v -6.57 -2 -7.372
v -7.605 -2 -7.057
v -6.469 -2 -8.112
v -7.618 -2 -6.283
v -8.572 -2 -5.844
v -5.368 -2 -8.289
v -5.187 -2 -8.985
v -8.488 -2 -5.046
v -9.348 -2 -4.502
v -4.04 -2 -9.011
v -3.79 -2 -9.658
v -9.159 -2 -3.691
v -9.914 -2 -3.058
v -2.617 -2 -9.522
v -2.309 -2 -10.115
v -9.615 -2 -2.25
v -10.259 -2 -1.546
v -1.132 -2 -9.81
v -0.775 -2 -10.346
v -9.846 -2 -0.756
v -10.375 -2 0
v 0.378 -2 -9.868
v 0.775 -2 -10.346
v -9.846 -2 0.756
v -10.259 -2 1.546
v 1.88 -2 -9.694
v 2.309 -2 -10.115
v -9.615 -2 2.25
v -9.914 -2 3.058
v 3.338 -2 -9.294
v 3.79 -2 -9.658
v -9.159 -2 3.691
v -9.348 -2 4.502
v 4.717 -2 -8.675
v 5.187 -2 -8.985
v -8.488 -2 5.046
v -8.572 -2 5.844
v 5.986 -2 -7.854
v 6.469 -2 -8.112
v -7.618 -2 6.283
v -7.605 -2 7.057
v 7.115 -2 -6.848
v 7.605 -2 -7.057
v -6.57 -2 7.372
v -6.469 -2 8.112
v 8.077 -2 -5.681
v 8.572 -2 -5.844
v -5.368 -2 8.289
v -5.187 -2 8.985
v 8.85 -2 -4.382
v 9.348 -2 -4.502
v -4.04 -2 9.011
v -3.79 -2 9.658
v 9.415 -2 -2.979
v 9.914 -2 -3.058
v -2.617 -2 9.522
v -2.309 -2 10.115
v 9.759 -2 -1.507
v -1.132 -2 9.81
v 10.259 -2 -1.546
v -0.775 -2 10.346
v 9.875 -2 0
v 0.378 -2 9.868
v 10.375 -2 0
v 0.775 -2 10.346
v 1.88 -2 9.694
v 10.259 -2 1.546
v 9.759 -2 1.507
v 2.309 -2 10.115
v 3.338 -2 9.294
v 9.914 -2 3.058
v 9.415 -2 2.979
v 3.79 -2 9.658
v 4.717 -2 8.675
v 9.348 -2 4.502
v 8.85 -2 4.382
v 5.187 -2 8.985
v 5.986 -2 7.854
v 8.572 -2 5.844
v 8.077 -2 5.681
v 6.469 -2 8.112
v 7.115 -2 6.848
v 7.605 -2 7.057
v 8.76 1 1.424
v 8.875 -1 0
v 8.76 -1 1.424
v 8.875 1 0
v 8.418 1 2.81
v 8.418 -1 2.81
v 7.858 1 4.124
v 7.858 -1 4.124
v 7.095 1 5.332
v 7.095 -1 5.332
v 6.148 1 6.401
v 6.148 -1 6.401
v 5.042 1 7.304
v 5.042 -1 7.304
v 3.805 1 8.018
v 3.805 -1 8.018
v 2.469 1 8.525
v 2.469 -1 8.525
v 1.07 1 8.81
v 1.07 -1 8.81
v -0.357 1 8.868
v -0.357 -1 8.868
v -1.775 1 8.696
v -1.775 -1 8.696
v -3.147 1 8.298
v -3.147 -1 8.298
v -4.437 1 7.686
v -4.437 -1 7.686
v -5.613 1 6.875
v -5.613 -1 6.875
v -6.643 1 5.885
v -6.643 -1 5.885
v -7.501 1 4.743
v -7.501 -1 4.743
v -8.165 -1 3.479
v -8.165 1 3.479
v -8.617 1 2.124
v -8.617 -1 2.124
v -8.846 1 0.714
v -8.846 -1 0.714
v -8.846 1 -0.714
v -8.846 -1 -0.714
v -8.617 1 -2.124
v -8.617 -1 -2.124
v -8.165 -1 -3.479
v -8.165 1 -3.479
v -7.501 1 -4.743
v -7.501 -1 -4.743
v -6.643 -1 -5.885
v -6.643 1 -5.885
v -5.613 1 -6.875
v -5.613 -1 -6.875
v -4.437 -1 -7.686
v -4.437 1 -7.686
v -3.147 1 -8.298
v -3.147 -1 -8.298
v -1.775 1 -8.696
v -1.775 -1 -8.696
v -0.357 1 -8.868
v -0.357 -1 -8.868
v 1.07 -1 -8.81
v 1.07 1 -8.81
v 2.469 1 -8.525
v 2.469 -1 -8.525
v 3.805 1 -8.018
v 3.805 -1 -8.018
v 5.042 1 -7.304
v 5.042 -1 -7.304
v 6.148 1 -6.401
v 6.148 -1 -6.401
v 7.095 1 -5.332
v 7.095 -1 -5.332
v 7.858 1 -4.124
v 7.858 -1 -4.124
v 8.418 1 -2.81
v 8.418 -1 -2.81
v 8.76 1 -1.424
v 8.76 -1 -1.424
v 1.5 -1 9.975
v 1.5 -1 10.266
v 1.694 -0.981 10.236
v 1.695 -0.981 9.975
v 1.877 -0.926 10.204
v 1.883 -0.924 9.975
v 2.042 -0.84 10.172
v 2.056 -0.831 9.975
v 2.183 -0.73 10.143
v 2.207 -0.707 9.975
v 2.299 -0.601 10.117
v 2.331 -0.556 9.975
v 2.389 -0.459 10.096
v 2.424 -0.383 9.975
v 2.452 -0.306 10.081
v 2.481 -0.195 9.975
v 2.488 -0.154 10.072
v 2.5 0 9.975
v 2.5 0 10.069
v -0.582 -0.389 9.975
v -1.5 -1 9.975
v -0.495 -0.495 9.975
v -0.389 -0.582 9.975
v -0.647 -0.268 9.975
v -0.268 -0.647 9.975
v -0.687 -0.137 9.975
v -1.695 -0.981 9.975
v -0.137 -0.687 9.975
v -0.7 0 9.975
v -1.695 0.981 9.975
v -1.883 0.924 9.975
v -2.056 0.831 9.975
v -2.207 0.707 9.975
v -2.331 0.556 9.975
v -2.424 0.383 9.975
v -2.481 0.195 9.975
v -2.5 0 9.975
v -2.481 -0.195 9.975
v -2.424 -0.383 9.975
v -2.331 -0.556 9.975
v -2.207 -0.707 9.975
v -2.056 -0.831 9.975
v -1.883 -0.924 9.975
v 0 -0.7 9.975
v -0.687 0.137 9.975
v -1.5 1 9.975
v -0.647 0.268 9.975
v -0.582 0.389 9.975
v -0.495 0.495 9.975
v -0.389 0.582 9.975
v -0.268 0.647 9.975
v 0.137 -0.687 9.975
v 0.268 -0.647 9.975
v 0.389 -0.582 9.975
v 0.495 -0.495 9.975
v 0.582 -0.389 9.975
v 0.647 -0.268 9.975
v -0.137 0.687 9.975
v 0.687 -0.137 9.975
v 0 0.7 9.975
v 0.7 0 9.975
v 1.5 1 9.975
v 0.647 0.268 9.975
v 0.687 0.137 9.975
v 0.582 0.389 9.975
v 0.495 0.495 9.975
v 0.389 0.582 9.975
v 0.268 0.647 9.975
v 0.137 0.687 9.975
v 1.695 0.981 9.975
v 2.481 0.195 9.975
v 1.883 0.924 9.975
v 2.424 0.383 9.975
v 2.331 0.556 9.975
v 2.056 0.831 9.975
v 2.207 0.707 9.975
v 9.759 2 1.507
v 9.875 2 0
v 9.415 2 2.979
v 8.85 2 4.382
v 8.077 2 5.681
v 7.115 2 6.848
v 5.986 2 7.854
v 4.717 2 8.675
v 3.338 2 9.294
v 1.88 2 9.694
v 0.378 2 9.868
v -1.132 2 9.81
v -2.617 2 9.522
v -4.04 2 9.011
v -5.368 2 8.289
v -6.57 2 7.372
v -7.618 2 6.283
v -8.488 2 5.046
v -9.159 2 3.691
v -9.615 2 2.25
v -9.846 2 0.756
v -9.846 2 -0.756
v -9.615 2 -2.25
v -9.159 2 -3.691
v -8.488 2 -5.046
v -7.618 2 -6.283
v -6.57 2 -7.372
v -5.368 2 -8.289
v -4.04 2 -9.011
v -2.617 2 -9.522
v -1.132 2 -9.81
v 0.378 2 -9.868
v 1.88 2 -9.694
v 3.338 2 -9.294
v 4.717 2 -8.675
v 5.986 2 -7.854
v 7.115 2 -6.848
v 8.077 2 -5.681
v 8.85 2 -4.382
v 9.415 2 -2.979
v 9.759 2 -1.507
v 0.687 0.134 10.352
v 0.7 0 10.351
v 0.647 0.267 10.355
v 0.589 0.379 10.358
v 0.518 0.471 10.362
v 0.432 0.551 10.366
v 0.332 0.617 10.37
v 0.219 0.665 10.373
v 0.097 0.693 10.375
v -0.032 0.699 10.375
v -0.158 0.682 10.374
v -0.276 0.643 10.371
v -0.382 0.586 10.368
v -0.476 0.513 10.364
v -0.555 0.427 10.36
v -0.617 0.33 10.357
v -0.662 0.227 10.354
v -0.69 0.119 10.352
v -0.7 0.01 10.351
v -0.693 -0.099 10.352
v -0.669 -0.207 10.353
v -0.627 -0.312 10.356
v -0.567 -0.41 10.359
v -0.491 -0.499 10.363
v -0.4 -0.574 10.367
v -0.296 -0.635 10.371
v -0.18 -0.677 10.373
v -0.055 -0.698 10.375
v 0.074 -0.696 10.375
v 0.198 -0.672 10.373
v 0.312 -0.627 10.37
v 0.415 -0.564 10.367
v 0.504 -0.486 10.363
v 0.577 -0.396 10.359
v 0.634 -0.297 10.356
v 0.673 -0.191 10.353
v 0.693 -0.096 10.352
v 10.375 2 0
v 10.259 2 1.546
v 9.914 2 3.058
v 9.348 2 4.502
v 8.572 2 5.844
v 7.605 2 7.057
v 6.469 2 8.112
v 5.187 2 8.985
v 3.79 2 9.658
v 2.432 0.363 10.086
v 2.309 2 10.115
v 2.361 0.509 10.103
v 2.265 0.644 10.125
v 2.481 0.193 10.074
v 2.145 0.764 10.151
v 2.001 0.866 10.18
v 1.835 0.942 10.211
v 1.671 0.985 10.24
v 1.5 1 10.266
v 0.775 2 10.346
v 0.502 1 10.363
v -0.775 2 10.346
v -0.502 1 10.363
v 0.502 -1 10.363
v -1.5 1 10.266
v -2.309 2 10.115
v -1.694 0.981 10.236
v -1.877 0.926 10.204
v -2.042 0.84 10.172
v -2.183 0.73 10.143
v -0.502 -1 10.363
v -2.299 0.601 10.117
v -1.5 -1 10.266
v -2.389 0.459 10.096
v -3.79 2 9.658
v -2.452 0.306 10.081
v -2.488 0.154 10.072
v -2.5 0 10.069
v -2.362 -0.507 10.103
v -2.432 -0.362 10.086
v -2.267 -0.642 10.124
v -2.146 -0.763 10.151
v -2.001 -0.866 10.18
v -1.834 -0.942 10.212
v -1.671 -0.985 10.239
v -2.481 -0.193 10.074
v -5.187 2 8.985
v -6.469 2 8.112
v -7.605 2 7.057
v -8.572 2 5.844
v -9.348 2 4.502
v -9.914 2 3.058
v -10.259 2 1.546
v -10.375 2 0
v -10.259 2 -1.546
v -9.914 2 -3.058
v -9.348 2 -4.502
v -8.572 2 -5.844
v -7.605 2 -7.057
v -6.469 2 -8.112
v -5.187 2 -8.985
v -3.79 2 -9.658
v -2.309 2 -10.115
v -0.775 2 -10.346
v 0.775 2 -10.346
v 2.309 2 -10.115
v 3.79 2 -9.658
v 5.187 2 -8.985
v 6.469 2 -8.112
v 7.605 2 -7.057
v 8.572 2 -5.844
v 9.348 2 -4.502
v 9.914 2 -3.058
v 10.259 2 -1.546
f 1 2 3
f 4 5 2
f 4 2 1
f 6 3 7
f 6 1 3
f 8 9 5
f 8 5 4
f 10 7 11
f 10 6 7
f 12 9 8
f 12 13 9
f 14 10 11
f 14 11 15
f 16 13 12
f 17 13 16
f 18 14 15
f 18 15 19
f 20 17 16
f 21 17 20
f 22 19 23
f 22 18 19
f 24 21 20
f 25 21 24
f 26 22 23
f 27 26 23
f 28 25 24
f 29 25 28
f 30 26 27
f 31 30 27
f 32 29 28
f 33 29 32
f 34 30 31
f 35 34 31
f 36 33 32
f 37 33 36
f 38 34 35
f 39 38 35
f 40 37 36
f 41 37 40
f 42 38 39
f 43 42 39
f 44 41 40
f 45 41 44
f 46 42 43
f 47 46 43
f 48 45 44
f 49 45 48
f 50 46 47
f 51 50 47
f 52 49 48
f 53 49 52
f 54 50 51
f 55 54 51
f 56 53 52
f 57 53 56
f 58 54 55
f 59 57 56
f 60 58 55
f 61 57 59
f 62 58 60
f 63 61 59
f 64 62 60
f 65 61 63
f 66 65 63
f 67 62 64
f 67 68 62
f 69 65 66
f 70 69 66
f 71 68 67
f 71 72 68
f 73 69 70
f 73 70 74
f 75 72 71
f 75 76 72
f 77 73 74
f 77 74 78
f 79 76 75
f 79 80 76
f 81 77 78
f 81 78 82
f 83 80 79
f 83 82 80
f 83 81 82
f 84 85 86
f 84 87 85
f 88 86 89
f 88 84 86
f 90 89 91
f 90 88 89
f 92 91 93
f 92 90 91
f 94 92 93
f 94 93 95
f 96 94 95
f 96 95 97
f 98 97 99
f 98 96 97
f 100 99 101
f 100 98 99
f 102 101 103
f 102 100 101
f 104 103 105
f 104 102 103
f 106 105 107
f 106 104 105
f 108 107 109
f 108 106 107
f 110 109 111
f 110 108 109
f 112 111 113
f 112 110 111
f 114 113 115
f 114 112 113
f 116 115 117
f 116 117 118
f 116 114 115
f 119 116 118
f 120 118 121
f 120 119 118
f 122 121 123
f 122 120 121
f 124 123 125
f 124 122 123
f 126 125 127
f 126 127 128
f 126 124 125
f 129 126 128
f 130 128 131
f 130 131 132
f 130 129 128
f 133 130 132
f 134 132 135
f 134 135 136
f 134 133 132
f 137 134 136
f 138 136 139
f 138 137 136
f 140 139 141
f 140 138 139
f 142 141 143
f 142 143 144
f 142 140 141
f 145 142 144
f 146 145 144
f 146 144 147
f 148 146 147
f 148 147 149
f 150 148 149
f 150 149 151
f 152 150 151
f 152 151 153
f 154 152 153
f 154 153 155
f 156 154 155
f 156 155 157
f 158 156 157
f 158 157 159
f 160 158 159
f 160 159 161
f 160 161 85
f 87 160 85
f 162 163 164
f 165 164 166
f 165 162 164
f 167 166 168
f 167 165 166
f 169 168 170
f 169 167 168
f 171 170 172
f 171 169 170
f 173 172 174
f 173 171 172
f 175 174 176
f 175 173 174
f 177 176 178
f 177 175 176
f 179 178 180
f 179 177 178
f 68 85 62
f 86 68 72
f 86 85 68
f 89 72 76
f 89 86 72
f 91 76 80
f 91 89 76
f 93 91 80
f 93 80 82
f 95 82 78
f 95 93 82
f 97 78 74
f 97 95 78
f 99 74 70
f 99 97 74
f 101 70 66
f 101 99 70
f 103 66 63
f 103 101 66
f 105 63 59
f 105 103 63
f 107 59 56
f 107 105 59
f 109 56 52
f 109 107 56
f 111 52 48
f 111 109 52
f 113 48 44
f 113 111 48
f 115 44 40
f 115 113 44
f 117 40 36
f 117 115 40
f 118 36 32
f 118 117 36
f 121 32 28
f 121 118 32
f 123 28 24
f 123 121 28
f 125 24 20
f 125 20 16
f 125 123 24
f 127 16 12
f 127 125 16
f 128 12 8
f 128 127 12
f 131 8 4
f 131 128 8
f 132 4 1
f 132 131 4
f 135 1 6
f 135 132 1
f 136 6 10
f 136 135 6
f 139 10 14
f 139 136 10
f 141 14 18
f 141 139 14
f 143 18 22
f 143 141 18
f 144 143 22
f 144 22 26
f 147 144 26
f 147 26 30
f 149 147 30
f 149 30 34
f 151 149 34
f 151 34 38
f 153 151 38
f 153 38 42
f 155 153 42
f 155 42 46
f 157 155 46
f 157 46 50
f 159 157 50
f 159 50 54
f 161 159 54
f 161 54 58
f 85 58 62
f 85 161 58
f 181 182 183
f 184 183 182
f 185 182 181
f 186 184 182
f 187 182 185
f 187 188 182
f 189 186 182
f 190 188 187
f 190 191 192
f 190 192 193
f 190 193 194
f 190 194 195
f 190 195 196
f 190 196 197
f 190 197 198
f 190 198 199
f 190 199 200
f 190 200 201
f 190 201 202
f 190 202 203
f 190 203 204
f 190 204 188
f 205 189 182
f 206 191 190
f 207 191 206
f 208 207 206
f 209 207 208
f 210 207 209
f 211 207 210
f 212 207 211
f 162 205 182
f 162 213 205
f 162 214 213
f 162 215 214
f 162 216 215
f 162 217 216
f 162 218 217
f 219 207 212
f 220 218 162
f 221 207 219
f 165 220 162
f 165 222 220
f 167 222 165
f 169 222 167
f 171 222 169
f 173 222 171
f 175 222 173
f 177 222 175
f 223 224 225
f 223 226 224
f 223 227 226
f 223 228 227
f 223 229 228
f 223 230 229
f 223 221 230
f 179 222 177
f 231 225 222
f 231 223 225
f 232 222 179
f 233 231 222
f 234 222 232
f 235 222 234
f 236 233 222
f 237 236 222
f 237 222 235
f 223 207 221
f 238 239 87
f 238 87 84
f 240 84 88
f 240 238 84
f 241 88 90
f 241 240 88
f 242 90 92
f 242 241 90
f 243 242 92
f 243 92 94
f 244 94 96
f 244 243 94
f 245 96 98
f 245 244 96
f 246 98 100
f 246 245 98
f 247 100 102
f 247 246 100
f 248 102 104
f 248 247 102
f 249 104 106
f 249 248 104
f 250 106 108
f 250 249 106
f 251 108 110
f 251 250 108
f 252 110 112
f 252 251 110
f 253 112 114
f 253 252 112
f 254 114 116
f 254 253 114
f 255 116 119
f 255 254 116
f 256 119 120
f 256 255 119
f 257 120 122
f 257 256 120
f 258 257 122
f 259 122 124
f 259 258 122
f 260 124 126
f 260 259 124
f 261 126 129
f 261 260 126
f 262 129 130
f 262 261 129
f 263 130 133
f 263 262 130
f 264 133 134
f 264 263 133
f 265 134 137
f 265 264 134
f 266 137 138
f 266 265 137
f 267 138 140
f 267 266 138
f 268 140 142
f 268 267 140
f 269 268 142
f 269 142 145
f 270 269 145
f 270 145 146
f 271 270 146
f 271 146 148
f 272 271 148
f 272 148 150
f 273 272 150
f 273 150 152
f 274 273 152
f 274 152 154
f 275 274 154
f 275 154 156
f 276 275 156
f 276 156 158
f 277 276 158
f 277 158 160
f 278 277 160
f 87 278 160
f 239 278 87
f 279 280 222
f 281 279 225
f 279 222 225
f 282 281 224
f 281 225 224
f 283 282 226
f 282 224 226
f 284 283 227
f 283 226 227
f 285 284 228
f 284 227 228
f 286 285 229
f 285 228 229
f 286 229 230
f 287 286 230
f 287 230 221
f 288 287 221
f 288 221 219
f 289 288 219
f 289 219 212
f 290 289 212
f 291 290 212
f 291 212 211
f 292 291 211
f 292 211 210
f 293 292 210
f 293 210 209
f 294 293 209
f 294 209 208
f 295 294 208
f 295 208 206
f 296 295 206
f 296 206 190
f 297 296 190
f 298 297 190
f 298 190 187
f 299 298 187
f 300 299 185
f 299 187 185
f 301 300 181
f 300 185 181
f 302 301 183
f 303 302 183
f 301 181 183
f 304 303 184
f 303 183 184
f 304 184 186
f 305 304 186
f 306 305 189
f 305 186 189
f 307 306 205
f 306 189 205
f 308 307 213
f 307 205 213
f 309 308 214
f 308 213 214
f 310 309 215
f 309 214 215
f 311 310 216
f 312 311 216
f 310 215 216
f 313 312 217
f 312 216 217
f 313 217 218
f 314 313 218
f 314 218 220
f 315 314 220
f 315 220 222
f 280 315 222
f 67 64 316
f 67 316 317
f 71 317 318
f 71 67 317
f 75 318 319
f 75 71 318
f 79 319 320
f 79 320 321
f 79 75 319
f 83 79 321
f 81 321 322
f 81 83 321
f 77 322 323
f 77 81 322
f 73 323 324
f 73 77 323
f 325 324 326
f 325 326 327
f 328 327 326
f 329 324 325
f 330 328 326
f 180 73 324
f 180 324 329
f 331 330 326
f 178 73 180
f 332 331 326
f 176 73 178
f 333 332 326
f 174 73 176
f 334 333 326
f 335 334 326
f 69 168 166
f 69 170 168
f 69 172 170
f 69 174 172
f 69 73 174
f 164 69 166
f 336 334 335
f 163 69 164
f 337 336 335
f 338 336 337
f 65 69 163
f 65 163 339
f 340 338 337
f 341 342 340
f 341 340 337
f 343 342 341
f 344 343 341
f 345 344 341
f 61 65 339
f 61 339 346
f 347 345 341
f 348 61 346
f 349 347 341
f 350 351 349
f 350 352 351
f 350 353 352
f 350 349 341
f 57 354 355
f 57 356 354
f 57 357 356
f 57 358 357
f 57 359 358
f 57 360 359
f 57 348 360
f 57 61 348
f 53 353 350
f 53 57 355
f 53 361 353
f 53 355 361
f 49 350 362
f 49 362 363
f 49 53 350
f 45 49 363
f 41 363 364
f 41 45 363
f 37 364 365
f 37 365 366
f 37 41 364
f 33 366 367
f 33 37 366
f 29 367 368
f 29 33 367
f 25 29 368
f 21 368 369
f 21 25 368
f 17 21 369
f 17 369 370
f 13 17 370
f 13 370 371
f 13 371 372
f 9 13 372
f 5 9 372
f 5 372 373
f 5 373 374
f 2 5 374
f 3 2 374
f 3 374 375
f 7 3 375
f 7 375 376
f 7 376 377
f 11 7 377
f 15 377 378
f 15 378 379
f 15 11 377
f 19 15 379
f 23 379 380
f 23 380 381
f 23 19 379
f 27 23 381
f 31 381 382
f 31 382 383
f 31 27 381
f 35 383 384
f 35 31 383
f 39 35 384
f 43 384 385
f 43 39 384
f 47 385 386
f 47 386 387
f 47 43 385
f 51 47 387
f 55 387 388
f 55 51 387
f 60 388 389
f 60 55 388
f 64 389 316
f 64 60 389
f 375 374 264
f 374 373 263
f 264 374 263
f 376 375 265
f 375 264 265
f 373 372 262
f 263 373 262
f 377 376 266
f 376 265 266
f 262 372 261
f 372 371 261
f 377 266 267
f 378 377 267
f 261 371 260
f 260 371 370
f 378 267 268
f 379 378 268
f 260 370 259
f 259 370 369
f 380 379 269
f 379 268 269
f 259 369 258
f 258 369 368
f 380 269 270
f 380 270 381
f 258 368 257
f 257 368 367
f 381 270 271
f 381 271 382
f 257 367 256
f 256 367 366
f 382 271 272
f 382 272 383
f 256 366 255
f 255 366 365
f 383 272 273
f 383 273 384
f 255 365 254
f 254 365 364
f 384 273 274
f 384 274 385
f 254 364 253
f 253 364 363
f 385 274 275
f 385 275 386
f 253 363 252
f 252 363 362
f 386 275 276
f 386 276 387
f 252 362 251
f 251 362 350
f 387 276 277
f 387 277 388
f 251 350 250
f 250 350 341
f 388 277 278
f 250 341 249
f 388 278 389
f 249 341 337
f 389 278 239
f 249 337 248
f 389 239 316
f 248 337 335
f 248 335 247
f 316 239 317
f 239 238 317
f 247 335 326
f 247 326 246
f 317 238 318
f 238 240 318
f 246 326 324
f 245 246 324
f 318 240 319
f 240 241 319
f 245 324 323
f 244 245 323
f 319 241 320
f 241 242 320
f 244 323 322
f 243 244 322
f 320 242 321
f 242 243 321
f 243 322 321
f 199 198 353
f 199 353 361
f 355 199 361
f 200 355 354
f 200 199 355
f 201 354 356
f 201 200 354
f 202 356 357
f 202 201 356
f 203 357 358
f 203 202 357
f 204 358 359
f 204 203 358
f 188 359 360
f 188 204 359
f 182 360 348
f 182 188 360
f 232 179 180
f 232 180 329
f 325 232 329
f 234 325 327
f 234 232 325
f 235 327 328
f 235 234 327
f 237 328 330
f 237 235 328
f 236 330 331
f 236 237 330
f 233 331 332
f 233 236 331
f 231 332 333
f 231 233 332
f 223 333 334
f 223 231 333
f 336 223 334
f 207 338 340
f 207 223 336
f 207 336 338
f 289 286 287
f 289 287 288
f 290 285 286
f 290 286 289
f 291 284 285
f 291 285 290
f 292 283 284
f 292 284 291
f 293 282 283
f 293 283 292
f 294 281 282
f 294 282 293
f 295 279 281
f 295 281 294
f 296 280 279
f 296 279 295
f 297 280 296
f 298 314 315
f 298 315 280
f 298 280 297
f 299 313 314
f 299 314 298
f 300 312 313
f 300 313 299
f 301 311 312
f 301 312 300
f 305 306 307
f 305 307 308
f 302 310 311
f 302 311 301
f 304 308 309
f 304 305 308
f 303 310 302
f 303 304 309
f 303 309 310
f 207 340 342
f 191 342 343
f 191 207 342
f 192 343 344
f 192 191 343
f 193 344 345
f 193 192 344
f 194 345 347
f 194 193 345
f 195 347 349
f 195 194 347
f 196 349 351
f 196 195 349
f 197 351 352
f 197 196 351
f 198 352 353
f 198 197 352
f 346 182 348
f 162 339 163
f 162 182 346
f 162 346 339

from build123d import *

# Parameters (mm, degrees)
F0_R          = 10.375
F0_R_2        = 8.875
F1_DEPTH      = 2
F1_DEPTH_BACK = 2
F2_SIZE       = 1
F4_START      = 9.975
F3_R          = 0.7
F4_DEPTH      = 15.025


with BuildPart() as f1:
    # F0 (on Front) → F1 (new body, two sides)
    with BuildSketch(Plane.XZ) as f1_sk:
        Circle(F0_R)
        Circle(F0_R_2, mode=Mode.SUBTRACT)
    extrude(amount=F1_DEPTH)
    extrude(f1_sk.sketch, amount=-F1_DEPTH_BACK)

    # F2
    f2_edges = [f1.edges().sort_by_distance(p)[0] for p in [
        (-8.875, -2, 0),
        (-8.875, 2, 0),
    ]]
    chamfer(f2_edges, length=F2_SIZE)

    # F3 (on Top) → F4 (cut)
    with BuildSketch(Plane.XY.offset(F4_START)):
        with BuildLine():
            Line((-1.5, -1), (1.5, -1))
            ThreePointArc((1.5, -1), (2.2071067812, -0.7071067812), (2.5, 0))
            ThreePointArc((2.5, 0), (2.2071067812, 0.7071067812), (1.5, 1))
            Line((1.5, 1), (-1.5, 1))
            ThreePointArc((-1.5, 1), (-2.2071067812, 0.7071067812), (-2.5, 0))
            ThreePointArc((-2.5, 0), (-2.2071067812, -0.7071067812), (-1.5, -1))
        make_face()
        Circle(F3_R, mode=Mode.SUBTRACT)
    extrude(amount=F4_DEPTH, mode=Mode.SUBTRACT)


solid = f1.part
